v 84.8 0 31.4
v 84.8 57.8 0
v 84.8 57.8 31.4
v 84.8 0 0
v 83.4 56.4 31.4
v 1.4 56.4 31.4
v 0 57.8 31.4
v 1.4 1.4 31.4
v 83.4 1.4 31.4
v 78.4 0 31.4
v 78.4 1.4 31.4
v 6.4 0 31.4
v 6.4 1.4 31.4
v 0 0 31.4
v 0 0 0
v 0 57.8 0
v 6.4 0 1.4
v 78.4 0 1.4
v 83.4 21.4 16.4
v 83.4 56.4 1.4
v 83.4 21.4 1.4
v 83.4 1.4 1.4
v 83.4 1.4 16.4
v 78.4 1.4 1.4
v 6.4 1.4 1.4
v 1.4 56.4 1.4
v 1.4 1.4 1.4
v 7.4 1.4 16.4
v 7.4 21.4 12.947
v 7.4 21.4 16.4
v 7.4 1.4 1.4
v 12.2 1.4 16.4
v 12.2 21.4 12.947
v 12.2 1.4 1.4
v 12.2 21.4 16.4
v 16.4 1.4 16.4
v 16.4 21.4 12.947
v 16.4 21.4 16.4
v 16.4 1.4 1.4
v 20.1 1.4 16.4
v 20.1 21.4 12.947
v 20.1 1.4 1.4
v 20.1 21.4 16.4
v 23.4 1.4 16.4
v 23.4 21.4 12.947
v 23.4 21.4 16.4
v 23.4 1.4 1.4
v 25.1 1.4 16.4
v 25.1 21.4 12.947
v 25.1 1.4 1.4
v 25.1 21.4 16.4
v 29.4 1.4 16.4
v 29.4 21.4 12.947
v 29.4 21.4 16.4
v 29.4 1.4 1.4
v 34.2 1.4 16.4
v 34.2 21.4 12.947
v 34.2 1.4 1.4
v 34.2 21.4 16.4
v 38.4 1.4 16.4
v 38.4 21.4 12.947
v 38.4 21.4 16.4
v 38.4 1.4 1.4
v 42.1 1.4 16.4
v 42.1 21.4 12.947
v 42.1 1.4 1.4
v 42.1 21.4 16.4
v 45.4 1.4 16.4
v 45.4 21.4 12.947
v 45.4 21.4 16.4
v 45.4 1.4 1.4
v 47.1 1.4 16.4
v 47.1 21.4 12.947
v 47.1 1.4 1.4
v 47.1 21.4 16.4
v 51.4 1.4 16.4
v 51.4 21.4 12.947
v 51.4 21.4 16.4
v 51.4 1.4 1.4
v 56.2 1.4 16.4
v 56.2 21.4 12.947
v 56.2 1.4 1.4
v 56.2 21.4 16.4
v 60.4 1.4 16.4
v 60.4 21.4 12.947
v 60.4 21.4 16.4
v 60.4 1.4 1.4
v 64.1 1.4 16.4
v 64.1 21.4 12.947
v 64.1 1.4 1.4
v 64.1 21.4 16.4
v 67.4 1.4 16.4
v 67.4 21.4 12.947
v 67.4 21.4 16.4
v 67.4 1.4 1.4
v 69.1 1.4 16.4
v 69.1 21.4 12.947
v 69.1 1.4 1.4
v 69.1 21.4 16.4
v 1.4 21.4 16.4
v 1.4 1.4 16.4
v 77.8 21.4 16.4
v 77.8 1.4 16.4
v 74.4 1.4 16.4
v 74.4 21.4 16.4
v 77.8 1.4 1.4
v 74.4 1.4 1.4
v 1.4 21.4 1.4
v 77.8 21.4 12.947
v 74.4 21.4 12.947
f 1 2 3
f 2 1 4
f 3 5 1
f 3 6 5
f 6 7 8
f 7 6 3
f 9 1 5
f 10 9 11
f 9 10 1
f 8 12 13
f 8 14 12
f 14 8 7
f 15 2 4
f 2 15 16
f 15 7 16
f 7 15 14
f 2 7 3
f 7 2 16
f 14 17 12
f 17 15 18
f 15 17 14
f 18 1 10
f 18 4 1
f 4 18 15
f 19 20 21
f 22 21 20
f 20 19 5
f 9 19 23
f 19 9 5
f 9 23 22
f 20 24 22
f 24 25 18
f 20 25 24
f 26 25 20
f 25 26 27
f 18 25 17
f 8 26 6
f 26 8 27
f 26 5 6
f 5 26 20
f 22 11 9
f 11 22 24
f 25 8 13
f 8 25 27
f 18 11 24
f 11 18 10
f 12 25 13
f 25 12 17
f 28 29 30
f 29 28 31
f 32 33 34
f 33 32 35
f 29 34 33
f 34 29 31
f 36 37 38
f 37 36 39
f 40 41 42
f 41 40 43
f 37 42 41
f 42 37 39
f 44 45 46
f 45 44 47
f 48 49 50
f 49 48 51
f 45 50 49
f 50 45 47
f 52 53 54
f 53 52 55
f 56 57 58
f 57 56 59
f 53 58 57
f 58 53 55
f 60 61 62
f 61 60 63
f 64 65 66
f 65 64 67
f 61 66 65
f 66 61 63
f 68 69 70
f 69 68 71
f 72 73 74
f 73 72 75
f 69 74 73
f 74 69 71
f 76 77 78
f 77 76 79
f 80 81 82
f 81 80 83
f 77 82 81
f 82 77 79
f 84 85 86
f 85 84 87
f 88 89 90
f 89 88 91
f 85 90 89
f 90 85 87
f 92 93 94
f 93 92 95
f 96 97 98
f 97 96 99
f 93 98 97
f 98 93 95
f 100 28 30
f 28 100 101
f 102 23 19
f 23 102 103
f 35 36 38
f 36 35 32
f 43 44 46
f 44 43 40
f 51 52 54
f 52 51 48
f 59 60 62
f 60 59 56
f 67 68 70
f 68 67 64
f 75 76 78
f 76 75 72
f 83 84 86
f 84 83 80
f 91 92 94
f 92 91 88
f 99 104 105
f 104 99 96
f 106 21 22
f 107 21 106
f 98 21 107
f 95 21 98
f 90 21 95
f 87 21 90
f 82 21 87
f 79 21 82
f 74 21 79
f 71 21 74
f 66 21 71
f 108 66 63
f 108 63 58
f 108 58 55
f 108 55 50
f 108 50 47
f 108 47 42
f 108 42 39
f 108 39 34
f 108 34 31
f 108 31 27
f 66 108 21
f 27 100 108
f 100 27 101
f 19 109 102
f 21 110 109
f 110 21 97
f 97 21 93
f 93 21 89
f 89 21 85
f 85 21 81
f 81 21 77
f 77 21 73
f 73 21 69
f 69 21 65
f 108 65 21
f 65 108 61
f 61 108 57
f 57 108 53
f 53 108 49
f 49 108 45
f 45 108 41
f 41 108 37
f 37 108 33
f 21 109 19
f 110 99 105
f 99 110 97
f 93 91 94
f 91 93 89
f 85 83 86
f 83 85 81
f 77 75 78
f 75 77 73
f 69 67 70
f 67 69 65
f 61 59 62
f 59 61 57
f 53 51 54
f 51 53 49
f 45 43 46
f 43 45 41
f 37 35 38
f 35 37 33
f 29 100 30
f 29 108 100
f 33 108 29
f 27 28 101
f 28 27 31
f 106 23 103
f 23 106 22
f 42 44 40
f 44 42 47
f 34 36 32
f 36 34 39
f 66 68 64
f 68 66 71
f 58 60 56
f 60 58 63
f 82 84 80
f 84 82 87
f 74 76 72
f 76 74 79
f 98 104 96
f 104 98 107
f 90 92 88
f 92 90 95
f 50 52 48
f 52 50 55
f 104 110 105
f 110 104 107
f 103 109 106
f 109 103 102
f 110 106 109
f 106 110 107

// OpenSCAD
// file: parts.scad
$fn=100;

//x,y,z -> l,w,h

pn532_l=42.4;
pn532_w=40.3;
pn532_h=7;
module pn532()
{
  color("red") {
      difference()
      {
          cube([pn532_l,pn532_w,pn532_h]);
  //        cyclinder(h=h, d=3);
      }
  }
}

//note: bottom is 20.2 and 34.2
hlkpm01_w=20;
hlkpm01_l=34;
hlkpm01_h=15.2;

module hlkpm01()
{
  color("black")
  {
    l=hlkpm01_l;
    w=hlkpm01_w;
    h=hlkpm01_h;
    cube([l,w,h]);

    translate([l/2-29.4/2, w/2-5/2, 0])  cylinder(d=0.8,h=h+5);
    translate([l/2-29.4/2, w/2+5/2, 0])  cylinder(d=0.8,h=h+5);
    translate([l/2+29.4/2, w/2-15.4/2, 0])  cylinder(d=0.8,h=h+5);
    translate([l/2+29.4/2, w/2+15.4/2, 0])  cylinder(d=0.8,h=h+5);

  }
}



breadboard170_l=46.4;
breadboard170_w=34.5;
breadboard170_h=9.7;
module breadboard170()
{
    color ("white")
    {
        l=breadboard170_l;
        w=breadboard170_w;
        h=breadboard170_h;
        difference(){
            union()
            {
                //main
                cube([l,w,h]);
                //notch
                margin=0.2;
                bl=4.45+margin;
                bh=5.3+margin;
                bw=1.7+margin;
                translate([l/2-bl/2, -bw, 1]) cube([bl,bw,bh]);
                translate([-bw, w/2-bl/2, 1]) cube([bw,bl,bh]);
            }
            translate([4.8,w/2,0]) cylinder(d=3.5,h=h);
            translate([l-4.8,w/2,0]) cylinder(d=3.5,h=h);
        }
    }
}


breadboard400_l=82.4;
breadboard400_w=54.7;
breadboard400_h=9.7;
module breadboard400()
{
    color ("white")
    {
        l=breadboard400_l;
        w=breadboard400_w;
        h=breadboard400_h;
        difference(){
            union()
            {
                //main
                cube([l,w,h]);
                //notch
                margin=0.2;
                /*bl=2.1+margin;*/
                bl=4+margin; /* other brand /type */
                bh=breadboard400_h;
                bw=1.7+margin;
                translate([13.1, -bw, 0]) cube([bl,bw,bh]);
                translate([breadboard400_l-13.1-bw, -bw, 0]) cube([bl,bw,bh]);

                translate([breadboard400_l, 3.8, 0]) cube([bw,bl,bh]);
                translate([breadboard400_l, breadboard400_w-3.8-bl, 0]) cube([bw,bl,bh]);
                translate([breadboard400_l, (breadboard400_w-bl)/2, 0]) cube([bw,bl,bh]);
                /*translate([], -bw, 0]) cube([bl,bw,bh]);*/

                /*translate([-bw, w/2-bl/2, 0]) cube([bw,bl,bh]);*/
            }
            translate([4.8,w/2,0]) cylinder(d=3.5,h=h);
            translate([l-4.8,w/2,0]) cylinder(d=3.5,h=h);
        }
    }
}


wemosd1mini_w=25.5;
wemosd1mini_l=34.6;
wemosd1mini_h=6.5;

module wemosd1mini()
{
  color("blue")
  {
    wemosd1mini_w=25.5;
    wemosd1mini_l=34.6;
    wemosd1mini_h=6.5;
    cube([wemosd1mini_l,wemosd1mini_w,wemosd1mini_h]);
  }
}



//crate , specifiy inner dimensions
module crate(w,l,h,wall)
{
    difference()
    {
        cube([w+wall*2,  l+wall*2,  h+wall]);
        translate([wall,wall,wall]) cube([w, l, h+wall]);
    }
}

//a crate with only the corners
// specifiy inner dimensions, and how much to close it from the bottom and corners
module open_crate(w,l,h,wall,corner, bottom)
{
    difference()
    {
        crate(w,l,h,wall);

        translate([0, wall+corner, wall+bottom]) cube([w+wall*2,  l-corner*2,  h]);
        //same as above, but for x
        translate([wall+corner, 0, wall+bottom]) cube([w-corner*2,l+wall*2,  h]);
    }
}

//a cover that fits inside a crate (a crate that has w,l,h as inner dimensions)
//basically a open_crate with a rimm that sticks out by crate_wall mm
module cover(w,l,h,wall,corner, bottom,crate_wall)
{

        open_crate(w-wall*2,l-wall*2,h, wall, corner, bottom);

        //the rimm
        translate([-crate_wall, -crate_wall,0]) cube([w+crate_wall*2, l+crate_wall*2, wall]);
}




module trapezoid(base,top,height, depth)
{

    polyhedron(
        points=[
            //front
            [0,0,0],
            [base,0,0],
            [(base/2)+(top/2),height,0],
            [(base/2)-(top/2),height,0],

            //rear
            [0,0,depth],
            [base,0,depth],
            [(base/2)+(top/2),height,depth],
            [(base/2)-(top/2),height,depth],
        ],

        faces=[
            [0,1,2,3], //front
            [7,6,5,4], //rear
            [0,4,5,1], //bottom
            [2,6,7,3], //top
            [0,3,7,4], //left
            [5,6,2,1], //right

        ]

    );
}


module test(s,h)
{
    for (a =[0,90,180,270])
    {
        rotate([0,0,a+45])
        {
            translate([-s/2,-s/2,0])
            {
                cube([s*3,s,h]);
                translate([s*2,-s*2,0])cube([s,s*2,h]);
            }
        }
    }
}


module test2(h,wall)
{
    r=1.3 * h;
    b=0.4 * h;

    center= sqrt(pow(r,2)-pow((h/2),2))+b/2;

    difference()
    {
        translate([-h/2,-b/2,0])cube([h,b,wall]);
        translate([0,center,0]) color("red") cylinder(d=r*2, wall);
        translate([0,-center,0]) color("red") cylinder(d=r*2, wall);
    }


    difference()
    {
        translate([-b/2,-h/2,0])cube([b,h,wall]);
        translate([center,0,0]) color("red") cylinder(d=r*2, wall);
        translate([-center,0,0]) color("red") cylinder(d=r*2, wall);
    }
}
// main file
/*5
3.8
1.8
3.4 aanvoer*/


include <parts.scad>

$fn=100;
wall=1.4;

//margins for pressfitting
margin=0.3;
module guide(offset, angle, diameter)
{
  translate([offset,0,10]) rotate([angle,0,0]) cube([diameter, 100,100]);
  translate([offset,0,10]) cube([diameter, 100,100]);

}

case_l=82;
case_w=55;
case_h=30;

difference()
{

  union()
  {

    difference()
    {
      //main crate
      crate(case_l, case_w, 30, wall);

      //open wall for cables
      translate([wall+5, 0,wall]) cube([case_l-10, wall, case_h]);
    }


    //cable guide block
    translate([wall, wall, wall])
    {
      difference()
      {
        //main filling material
        cube([case_l, 20, 15]);



        for(offset = [6 : 22 : 60])
        {

          translate([offset+0,0,0]) rotate([30,0,0]) cube([4.8, 100,100]); //5mm
          translate([offset+9,0,0]) rotate([30,0,0]) cube([3.7, 100,100]); //3.8mm
          translate([offset+16,0,0]) rotate([30,0,0]) cube([1.7, 100,100]); //1.8mm
        }

        //powerblock cable guide (flat 3.4mm)
        translate([case_l-9,0,0]) rotate([30,0,0]) cube([3.4, 100,100]);


        //powerblock
        /*translate([+10, wall-(breadboard400_w+margin), 0])
        {
        translate([2, 40-wall, hlkpm01_h+4])
        {
        rotate([180,0,90])
        {
        hlkpm01();
      }
    }
  }


  //3.8 mm
  guide(35, -30, 3.7);
  guide(45, -30, 3.7);
  guide(55, -30, 3.7);


  //1.8 mm
  guide(65, -30, 1.7);
  guide(70, -30, 1.7);
  guide(75, -30, 1.7);

  //5 mm
  guide(80, -30, 4.8);
  guide(90, -30, 4.8);*/



}
}

//breadboard crate
//    open_crate((breadboard400_l+margin),(breadboard400_w+margin),breadboard400_h, wall,2,3);

/*translate([wall, wall, wall])
{
//  difference()
{
translate([2, 39, hlkpm01_h+10])
{
rotate([180,0,90])
{
//        hlkpm01();
}
}
}
}*/
}

/*
//breadboard substract
translate([wall, wall, wall])
{
breadboard400();
}

//screw holes
translate([-4,7,0]) cylinder(d=3.5,h=wall);
translate([breadboard400_l+7, 7, 0]) cylinder(d=3.5,h=wall);

translate([-4, breadboard400_w-7, 0]) cylinder(d=3.5,h=wall);
translate([breadboard400_l+7, breadboard400_w-7, 0]) cylinder(d=3.5,h=wall);


//vent holes
for(offset = [0 : 5 : breadboard400_l])
translate([offset,0,15]) rotate([0,30,0]) cube([1,wall,15]);*/

}
